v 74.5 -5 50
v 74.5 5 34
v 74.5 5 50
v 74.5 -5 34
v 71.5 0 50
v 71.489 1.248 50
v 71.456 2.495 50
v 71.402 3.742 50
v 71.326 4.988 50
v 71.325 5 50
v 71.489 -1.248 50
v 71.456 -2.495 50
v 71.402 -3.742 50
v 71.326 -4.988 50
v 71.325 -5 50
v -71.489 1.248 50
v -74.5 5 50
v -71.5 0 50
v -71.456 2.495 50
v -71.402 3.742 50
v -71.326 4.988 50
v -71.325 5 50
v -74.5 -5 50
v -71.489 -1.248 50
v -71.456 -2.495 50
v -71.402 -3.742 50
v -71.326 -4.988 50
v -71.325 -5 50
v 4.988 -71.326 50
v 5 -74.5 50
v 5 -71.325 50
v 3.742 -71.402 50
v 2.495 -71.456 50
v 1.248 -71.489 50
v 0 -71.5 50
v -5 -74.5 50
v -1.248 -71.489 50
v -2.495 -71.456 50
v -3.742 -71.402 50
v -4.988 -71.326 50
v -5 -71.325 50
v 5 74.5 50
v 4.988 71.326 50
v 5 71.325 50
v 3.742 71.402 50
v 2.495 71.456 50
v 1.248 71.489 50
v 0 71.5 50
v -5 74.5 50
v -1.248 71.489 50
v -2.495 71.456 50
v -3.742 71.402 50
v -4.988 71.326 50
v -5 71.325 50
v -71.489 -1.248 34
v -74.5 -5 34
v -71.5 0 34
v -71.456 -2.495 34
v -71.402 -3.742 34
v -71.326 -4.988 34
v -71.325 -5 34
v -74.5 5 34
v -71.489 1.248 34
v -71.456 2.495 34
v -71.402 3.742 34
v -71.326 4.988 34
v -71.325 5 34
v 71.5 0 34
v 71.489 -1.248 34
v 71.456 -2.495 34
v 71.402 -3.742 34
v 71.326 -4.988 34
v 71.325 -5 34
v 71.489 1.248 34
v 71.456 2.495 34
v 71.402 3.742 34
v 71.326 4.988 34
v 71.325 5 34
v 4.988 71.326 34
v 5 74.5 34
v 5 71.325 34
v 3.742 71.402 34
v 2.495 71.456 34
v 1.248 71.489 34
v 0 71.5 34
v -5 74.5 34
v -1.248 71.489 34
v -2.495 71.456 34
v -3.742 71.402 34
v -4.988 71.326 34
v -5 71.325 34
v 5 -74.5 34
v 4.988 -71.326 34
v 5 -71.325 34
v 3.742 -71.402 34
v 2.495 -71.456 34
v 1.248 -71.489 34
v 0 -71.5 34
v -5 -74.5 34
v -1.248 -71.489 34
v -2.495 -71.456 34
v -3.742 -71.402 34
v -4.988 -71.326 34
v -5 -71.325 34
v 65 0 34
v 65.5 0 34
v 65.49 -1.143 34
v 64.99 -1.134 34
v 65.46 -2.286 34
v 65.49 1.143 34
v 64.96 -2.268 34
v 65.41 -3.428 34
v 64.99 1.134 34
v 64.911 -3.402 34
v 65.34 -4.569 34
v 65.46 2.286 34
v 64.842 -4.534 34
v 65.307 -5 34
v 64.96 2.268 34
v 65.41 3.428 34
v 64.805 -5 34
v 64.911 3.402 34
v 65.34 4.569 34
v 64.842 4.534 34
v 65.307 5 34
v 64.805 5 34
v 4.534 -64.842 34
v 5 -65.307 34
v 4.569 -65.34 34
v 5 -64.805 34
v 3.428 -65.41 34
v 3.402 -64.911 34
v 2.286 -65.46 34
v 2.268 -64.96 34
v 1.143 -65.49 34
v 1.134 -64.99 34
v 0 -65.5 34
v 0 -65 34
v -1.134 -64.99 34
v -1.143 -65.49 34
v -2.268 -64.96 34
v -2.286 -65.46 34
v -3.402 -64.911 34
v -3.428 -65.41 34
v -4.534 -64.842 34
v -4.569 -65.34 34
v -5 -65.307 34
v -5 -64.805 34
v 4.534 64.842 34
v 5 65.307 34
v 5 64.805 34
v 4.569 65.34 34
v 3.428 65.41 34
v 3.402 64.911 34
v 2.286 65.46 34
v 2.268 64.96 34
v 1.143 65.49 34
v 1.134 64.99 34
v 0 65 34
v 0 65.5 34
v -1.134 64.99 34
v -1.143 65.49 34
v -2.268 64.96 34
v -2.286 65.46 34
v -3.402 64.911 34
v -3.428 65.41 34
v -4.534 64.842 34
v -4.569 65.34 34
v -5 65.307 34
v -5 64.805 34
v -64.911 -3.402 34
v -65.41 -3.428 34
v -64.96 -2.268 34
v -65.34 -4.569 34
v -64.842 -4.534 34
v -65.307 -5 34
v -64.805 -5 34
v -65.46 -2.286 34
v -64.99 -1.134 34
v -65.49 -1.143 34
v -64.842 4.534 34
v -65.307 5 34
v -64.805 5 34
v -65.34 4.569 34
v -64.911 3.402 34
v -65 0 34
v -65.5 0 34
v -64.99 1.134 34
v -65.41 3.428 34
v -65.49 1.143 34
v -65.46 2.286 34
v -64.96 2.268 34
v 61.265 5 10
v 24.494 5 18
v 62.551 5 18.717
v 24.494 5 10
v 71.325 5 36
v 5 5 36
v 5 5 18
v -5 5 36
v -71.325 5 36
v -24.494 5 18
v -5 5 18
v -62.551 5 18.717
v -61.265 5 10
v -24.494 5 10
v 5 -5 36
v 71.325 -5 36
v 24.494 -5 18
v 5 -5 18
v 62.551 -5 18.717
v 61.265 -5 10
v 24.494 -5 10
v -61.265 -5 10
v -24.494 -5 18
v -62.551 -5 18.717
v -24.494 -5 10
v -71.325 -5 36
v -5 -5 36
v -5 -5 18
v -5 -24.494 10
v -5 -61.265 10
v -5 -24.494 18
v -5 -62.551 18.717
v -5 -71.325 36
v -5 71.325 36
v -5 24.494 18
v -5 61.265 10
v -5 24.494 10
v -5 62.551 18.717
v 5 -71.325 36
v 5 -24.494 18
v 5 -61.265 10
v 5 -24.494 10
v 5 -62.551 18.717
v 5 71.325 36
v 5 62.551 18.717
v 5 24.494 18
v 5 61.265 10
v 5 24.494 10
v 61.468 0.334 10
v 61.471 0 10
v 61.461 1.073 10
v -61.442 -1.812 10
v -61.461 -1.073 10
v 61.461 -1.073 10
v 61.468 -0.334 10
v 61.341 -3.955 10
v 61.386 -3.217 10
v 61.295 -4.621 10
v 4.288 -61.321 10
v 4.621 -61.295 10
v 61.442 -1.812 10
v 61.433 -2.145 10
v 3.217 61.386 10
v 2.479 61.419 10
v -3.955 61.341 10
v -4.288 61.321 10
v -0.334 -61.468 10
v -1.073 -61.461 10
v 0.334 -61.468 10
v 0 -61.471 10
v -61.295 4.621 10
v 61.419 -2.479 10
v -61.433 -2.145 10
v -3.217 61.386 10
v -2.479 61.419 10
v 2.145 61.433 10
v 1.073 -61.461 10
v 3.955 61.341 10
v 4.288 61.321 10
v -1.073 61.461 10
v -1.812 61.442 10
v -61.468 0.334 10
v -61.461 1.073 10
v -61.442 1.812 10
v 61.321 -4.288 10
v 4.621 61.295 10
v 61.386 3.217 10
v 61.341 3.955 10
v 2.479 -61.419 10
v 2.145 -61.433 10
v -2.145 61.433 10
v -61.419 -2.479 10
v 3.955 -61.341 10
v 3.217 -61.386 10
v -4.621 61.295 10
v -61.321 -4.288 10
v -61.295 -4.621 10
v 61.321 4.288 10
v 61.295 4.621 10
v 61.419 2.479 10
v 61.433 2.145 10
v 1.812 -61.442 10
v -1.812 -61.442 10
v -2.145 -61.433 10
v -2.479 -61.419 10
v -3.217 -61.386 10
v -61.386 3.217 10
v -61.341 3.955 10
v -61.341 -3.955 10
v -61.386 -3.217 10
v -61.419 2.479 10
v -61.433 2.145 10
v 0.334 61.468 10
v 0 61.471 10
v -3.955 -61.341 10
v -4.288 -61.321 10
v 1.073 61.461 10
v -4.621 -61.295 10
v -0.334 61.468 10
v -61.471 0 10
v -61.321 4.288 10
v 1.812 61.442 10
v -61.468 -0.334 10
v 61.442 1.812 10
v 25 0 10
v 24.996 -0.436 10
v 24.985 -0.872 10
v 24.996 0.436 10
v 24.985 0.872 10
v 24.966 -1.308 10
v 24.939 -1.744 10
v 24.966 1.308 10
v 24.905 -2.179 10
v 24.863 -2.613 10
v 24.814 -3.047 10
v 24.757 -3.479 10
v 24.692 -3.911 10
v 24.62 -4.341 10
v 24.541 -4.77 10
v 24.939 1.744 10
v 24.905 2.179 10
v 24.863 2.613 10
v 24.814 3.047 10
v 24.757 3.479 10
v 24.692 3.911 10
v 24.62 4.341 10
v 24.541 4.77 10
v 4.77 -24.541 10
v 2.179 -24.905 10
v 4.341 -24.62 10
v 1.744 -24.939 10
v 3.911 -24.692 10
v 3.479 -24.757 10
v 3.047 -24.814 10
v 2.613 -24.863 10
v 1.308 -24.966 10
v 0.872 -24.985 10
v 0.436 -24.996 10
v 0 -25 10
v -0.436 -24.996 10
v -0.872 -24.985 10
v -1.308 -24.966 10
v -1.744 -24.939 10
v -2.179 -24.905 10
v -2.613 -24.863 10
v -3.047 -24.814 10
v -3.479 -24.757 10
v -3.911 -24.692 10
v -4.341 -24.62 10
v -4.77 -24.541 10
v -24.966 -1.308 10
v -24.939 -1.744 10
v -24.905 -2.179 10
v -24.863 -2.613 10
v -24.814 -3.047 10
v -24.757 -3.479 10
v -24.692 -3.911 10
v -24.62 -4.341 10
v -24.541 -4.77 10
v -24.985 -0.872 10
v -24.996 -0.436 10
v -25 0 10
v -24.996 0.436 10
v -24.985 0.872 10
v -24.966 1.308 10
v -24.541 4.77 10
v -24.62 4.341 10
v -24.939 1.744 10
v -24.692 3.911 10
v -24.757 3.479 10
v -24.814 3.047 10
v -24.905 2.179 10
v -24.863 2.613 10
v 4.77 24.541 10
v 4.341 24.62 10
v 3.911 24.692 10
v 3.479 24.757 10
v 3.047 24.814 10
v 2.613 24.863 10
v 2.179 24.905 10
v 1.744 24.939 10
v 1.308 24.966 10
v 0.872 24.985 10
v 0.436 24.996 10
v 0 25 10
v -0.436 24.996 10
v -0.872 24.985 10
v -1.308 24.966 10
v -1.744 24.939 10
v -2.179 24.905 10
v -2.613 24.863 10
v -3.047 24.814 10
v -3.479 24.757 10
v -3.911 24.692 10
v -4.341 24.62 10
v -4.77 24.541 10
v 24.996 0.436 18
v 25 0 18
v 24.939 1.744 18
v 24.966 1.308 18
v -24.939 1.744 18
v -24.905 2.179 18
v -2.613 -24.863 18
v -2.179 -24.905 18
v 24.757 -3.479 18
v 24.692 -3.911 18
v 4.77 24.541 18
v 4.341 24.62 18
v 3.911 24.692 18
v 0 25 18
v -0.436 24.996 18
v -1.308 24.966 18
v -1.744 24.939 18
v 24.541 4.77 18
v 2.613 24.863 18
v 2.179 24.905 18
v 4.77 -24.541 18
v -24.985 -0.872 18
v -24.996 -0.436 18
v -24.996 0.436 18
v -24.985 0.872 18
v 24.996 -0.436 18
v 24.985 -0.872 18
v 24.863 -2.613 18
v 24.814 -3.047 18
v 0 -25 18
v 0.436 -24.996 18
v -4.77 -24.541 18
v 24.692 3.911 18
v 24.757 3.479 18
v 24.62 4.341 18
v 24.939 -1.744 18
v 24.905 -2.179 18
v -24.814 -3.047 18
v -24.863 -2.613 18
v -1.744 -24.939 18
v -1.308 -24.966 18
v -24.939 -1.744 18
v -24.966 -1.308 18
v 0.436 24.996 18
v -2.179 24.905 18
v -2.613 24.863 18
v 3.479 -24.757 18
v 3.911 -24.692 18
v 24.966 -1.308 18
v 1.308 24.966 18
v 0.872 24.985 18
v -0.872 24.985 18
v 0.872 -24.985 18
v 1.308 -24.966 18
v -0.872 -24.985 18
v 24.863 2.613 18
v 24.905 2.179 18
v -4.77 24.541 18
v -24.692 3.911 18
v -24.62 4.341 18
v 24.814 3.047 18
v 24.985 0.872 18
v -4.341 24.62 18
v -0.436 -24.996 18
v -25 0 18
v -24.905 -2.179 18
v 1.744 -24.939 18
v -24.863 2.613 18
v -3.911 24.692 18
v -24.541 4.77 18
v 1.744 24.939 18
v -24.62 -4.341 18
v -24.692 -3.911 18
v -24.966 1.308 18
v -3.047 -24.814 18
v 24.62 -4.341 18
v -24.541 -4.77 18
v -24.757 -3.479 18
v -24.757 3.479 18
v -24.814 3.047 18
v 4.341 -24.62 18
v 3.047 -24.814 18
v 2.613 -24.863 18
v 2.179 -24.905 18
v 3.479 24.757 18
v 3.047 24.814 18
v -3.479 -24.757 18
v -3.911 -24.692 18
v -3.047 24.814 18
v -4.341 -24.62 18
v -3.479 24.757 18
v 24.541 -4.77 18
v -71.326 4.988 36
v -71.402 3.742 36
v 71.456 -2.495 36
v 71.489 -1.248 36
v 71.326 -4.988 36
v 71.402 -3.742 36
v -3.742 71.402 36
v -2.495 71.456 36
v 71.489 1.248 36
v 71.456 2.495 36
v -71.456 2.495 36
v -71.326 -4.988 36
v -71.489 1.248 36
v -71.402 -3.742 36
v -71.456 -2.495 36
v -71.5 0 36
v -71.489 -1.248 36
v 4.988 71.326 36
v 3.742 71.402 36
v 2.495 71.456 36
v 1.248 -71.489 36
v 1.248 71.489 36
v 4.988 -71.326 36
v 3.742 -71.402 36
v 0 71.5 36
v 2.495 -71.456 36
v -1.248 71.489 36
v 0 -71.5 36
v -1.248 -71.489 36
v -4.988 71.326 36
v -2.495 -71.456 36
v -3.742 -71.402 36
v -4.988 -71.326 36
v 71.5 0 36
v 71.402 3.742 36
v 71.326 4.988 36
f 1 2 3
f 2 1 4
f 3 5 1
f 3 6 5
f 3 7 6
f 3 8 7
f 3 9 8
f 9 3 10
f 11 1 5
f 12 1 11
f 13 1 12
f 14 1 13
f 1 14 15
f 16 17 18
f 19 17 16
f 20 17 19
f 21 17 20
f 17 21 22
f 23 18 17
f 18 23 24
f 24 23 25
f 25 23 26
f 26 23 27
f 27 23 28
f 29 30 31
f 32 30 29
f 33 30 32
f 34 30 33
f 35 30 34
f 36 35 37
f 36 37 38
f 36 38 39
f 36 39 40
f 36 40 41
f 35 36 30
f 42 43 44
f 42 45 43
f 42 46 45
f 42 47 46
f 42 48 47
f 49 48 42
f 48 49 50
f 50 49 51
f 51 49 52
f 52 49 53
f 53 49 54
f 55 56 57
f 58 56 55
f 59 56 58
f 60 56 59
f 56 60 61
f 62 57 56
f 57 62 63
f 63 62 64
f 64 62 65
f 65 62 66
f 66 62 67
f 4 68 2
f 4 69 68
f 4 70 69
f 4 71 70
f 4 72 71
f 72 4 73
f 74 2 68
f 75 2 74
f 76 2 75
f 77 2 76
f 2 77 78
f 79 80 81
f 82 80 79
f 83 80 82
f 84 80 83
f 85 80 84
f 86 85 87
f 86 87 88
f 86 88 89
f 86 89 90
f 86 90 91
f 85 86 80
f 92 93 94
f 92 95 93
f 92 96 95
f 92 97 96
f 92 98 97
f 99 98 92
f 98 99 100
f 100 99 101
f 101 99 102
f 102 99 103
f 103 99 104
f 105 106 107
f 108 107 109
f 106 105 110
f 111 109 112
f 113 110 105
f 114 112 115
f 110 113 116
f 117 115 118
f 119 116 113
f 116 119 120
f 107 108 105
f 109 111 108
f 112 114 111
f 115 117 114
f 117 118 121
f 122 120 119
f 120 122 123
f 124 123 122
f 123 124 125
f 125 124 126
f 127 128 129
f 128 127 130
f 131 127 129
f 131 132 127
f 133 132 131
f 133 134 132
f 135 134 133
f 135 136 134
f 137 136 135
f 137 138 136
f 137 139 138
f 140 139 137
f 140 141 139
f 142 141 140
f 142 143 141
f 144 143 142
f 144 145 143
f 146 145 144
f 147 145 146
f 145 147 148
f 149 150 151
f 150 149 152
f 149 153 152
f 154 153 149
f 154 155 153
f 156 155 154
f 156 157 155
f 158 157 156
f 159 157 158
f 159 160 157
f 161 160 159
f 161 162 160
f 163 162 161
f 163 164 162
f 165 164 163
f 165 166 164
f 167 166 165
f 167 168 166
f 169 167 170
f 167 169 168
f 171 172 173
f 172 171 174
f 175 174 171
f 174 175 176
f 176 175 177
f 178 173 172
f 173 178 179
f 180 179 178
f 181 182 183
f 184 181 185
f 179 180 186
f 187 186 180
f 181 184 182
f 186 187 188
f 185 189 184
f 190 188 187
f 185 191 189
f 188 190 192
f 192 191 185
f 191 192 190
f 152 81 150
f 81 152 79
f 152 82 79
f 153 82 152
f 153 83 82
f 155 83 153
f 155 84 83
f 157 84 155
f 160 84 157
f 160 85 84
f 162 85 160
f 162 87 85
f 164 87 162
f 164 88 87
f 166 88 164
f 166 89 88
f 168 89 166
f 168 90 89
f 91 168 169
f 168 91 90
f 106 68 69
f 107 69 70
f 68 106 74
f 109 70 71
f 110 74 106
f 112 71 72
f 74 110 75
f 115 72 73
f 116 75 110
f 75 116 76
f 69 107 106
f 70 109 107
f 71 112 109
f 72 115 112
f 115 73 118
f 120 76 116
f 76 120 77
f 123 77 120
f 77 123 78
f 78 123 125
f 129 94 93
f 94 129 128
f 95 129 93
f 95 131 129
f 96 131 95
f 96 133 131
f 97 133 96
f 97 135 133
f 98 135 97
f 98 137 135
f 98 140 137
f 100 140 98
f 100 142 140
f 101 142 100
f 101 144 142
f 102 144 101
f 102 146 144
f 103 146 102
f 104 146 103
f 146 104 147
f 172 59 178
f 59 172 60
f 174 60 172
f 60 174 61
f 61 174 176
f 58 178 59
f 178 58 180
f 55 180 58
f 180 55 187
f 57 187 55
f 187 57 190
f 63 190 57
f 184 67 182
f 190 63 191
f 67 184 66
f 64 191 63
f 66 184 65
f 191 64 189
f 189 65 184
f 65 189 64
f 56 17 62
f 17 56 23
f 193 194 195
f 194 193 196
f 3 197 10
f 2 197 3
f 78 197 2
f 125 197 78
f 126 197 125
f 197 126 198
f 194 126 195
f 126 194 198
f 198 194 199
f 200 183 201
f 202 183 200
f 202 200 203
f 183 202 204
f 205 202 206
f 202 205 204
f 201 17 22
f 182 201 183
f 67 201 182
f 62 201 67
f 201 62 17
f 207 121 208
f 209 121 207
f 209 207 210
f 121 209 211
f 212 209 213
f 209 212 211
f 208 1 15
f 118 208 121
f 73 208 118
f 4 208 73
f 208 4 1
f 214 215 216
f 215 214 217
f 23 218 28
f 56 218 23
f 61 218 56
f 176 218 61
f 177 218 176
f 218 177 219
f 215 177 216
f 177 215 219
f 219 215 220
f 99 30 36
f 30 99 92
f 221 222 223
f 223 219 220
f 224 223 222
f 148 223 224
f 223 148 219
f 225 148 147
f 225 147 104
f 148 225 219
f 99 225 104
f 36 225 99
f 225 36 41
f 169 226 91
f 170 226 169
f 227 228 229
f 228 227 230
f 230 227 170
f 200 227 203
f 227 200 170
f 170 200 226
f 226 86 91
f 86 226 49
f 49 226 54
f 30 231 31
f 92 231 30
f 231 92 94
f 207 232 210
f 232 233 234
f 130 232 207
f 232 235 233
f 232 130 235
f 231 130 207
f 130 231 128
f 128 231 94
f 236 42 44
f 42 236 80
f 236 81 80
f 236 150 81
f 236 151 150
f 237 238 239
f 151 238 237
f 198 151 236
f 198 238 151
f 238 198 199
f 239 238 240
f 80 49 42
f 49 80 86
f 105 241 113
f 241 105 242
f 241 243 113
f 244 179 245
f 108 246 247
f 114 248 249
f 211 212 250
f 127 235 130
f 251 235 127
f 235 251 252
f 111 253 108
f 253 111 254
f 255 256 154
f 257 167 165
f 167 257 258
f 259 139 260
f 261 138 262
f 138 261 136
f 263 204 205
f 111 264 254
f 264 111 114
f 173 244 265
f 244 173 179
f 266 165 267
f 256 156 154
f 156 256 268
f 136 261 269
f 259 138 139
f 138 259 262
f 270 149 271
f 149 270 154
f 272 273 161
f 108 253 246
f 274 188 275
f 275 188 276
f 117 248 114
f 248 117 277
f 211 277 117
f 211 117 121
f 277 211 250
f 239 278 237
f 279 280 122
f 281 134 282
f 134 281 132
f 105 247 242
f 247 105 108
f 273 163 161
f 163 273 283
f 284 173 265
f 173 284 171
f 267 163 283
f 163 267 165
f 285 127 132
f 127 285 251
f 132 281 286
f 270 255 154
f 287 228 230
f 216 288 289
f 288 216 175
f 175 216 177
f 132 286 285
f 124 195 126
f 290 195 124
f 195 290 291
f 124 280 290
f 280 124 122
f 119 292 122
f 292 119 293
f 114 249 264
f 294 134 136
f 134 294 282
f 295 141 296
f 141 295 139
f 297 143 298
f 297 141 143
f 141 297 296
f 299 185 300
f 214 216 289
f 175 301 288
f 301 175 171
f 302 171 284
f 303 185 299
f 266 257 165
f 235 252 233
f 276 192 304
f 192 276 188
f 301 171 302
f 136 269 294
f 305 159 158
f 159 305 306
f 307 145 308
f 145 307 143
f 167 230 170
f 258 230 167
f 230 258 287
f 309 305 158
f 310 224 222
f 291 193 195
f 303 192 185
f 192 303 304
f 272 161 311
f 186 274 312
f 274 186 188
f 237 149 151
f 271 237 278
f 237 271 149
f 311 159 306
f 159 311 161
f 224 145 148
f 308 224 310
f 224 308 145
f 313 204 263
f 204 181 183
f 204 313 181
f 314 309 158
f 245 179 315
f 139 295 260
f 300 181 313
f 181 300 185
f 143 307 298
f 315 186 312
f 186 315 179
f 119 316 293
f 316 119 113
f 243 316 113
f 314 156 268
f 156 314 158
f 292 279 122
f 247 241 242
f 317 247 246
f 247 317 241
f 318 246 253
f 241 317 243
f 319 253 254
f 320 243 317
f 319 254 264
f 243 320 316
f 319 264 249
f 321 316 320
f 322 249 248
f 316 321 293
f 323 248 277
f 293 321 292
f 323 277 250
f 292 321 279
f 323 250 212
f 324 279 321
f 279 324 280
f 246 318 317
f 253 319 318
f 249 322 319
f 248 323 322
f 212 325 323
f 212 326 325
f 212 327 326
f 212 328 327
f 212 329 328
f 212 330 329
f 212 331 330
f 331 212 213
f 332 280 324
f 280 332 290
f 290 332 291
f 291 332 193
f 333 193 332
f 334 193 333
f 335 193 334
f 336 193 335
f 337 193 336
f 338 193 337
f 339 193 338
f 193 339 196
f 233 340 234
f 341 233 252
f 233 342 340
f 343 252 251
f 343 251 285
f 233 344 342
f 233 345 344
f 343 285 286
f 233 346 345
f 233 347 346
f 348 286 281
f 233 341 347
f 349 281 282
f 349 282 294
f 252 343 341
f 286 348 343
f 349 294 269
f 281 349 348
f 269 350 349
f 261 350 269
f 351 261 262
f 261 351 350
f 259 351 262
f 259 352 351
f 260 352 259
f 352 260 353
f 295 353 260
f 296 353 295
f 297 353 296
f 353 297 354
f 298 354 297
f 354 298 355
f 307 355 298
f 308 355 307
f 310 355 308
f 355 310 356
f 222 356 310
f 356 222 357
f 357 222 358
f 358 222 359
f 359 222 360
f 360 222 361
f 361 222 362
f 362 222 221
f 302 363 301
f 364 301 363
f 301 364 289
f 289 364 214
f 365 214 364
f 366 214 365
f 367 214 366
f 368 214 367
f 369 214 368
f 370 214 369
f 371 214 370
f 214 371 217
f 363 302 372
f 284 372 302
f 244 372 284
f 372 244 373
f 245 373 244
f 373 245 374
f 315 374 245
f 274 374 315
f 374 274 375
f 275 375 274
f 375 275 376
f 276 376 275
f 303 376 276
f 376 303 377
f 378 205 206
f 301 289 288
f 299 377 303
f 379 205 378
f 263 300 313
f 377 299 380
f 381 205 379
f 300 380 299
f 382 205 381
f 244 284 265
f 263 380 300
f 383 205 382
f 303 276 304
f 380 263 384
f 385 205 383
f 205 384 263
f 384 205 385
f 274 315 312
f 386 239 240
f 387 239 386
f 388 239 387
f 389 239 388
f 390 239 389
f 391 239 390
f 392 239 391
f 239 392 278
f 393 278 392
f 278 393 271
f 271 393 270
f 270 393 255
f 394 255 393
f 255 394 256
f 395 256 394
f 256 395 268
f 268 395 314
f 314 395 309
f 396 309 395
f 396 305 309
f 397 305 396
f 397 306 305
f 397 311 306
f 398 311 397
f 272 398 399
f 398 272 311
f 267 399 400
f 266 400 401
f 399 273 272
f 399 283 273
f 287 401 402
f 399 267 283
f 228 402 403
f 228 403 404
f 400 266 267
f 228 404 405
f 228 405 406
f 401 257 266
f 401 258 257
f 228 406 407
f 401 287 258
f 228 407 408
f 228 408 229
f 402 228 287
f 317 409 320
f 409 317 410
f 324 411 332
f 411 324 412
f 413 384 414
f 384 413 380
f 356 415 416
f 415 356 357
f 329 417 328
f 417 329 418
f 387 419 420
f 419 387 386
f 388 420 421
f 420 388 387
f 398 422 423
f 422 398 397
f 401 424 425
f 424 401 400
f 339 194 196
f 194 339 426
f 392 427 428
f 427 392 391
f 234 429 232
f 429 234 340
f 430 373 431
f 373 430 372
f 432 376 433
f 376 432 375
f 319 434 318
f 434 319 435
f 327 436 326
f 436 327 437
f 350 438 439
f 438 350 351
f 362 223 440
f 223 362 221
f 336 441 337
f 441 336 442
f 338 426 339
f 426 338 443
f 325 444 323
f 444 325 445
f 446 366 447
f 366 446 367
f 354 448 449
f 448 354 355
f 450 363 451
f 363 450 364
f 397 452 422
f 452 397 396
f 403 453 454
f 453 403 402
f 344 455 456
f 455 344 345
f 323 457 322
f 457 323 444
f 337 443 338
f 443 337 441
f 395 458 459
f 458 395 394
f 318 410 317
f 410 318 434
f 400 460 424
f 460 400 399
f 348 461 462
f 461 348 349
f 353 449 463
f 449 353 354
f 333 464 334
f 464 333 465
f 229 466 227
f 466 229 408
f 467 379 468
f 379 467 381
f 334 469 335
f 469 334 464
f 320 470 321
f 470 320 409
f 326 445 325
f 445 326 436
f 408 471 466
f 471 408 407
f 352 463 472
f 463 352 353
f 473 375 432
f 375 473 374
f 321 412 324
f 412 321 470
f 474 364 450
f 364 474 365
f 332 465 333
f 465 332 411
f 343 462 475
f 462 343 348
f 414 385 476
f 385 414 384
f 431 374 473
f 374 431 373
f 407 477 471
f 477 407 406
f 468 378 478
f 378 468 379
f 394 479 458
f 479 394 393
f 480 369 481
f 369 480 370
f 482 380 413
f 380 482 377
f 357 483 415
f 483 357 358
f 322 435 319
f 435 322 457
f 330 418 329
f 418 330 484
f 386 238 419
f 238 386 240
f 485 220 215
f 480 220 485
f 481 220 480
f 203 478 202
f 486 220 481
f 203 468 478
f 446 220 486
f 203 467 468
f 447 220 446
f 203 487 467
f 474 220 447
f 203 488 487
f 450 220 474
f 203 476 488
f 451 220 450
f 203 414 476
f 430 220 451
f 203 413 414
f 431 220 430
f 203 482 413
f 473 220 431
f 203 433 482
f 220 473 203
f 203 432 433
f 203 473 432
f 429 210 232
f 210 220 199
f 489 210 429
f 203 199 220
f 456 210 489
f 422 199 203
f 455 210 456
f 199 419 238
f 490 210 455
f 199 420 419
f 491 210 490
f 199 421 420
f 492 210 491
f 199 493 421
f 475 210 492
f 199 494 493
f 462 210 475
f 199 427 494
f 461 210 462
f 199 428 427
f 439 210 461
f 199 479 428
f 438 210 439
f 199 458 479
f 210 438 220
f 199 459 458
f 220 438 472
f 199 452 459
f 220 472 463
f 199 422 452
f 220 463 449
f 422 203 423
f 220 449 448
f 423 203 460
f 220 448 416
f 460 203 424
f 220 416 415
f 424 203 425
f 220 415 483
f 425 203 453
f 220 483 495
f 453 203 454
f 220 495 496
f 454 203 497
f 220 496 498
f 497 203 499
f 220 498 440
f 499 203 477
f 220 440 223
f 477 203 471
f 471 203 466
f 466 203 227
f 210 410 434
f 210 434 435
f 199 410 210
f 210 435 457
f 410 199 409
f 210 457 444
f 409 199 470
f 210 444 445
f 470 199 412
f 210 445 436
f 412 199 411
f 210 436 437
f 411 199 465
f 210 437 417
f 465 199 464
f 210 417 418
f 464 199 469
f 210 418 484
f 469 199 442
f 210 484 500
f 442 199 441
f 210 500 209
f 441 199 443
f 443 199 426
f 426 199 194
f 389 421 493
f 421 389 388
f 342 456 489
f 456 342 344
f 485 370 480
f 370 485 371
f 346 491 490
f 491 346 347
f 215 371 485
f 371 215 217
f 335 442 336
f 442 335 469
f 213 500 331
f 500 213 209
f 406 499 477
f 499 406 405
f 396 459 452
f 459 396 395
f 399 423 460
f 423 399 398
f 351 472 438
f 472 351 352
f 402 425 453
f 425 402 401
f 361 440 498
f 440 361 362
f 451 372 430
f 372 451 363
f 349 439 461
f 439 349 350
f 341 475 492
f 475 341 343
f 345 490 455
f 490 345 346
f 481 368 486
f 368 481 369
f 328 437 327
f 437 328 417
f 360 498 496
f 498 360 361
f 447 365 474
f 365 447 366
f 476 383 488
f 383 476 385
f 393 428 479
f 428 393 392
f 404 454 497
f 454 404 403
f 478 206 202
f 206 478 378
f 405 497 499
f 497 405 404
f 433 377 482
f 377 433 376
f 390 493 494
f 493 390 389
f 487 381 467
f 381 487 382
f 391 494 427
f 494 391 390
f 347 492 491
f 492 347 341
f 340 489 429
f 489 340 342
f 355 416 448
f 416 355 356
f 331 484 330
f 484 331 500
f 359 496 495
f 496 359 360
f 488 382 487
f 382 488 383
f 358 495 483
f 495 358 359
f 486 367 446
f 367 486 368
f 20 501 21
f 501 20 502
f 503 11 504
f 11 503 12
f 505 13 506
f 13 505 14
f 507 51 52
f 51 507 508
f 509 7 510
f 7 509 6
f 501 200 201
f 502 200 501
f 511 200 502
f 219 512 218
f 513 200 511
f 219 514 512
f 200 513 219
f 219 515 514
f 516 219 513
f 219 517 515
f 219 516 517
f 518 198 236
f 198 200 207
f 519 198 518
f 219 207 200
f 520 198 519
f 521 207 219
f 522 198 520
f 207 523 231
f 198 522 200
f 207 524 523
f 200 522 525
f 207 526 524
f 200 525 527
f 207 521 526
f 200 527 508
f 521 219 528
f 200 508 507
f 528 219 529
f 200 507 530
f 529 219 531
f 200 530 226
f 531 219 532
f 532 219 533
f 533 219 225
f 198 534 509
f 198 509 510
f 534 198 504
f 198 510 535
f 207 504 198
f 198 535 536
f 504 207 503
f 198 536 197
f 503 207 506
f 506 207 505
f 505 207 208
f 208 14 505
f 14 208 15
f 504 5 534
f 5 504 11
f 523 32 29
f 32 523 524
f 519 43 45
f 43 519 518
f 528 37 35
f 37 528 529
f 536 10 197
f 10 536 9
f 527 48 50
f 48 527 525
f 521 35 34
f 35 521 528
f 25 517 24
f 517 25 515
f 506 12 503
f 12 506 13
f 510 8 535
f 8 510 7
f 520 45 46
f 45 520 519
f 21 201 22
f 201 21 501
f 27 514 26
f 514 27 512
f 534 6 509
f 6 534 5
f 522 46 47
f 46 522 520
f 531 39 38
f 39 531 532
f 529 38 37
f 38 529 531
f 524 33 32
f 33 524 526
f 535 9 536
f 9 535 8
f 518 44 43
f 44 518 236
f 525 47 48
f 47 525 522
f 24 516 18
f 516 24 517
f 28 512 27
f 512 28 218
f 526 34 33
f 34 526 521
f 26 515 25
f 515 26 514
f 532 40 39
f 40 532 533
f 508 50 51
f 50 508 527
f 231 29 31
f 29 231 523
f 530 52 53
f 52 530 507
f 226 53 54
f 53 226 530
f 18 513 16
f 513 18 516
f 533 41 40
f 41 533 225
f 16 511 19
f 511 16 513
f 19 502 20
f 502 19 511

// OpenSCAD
$fn=360;

module dish() {    
    difference() {
        cylinder(d=143, h=34);
        translate([0,0,10]) cylinder(d=143-12, h=24.1);
    }
    translate([0,0,10]) cylinder(h=8, d=50);
}


difference() {
    union() {
        for (i = [0: 90: 180]) {
            rotate([0, 0, i]) translate([-149/2, -5, 34]) cube([149, 10, 16]);
        }
        intersection() {
            union() {
                translate([-130/2, -5, 0]) cube([130, 10, 34]);
                translate([-5, -130/2, 0]) cube([10, 130, 34]);
            }
            cylinder(d1=120,d2=130, h=34);
        }
    }
    dish();
    translate([0,0,36]) hull() dish();
}
